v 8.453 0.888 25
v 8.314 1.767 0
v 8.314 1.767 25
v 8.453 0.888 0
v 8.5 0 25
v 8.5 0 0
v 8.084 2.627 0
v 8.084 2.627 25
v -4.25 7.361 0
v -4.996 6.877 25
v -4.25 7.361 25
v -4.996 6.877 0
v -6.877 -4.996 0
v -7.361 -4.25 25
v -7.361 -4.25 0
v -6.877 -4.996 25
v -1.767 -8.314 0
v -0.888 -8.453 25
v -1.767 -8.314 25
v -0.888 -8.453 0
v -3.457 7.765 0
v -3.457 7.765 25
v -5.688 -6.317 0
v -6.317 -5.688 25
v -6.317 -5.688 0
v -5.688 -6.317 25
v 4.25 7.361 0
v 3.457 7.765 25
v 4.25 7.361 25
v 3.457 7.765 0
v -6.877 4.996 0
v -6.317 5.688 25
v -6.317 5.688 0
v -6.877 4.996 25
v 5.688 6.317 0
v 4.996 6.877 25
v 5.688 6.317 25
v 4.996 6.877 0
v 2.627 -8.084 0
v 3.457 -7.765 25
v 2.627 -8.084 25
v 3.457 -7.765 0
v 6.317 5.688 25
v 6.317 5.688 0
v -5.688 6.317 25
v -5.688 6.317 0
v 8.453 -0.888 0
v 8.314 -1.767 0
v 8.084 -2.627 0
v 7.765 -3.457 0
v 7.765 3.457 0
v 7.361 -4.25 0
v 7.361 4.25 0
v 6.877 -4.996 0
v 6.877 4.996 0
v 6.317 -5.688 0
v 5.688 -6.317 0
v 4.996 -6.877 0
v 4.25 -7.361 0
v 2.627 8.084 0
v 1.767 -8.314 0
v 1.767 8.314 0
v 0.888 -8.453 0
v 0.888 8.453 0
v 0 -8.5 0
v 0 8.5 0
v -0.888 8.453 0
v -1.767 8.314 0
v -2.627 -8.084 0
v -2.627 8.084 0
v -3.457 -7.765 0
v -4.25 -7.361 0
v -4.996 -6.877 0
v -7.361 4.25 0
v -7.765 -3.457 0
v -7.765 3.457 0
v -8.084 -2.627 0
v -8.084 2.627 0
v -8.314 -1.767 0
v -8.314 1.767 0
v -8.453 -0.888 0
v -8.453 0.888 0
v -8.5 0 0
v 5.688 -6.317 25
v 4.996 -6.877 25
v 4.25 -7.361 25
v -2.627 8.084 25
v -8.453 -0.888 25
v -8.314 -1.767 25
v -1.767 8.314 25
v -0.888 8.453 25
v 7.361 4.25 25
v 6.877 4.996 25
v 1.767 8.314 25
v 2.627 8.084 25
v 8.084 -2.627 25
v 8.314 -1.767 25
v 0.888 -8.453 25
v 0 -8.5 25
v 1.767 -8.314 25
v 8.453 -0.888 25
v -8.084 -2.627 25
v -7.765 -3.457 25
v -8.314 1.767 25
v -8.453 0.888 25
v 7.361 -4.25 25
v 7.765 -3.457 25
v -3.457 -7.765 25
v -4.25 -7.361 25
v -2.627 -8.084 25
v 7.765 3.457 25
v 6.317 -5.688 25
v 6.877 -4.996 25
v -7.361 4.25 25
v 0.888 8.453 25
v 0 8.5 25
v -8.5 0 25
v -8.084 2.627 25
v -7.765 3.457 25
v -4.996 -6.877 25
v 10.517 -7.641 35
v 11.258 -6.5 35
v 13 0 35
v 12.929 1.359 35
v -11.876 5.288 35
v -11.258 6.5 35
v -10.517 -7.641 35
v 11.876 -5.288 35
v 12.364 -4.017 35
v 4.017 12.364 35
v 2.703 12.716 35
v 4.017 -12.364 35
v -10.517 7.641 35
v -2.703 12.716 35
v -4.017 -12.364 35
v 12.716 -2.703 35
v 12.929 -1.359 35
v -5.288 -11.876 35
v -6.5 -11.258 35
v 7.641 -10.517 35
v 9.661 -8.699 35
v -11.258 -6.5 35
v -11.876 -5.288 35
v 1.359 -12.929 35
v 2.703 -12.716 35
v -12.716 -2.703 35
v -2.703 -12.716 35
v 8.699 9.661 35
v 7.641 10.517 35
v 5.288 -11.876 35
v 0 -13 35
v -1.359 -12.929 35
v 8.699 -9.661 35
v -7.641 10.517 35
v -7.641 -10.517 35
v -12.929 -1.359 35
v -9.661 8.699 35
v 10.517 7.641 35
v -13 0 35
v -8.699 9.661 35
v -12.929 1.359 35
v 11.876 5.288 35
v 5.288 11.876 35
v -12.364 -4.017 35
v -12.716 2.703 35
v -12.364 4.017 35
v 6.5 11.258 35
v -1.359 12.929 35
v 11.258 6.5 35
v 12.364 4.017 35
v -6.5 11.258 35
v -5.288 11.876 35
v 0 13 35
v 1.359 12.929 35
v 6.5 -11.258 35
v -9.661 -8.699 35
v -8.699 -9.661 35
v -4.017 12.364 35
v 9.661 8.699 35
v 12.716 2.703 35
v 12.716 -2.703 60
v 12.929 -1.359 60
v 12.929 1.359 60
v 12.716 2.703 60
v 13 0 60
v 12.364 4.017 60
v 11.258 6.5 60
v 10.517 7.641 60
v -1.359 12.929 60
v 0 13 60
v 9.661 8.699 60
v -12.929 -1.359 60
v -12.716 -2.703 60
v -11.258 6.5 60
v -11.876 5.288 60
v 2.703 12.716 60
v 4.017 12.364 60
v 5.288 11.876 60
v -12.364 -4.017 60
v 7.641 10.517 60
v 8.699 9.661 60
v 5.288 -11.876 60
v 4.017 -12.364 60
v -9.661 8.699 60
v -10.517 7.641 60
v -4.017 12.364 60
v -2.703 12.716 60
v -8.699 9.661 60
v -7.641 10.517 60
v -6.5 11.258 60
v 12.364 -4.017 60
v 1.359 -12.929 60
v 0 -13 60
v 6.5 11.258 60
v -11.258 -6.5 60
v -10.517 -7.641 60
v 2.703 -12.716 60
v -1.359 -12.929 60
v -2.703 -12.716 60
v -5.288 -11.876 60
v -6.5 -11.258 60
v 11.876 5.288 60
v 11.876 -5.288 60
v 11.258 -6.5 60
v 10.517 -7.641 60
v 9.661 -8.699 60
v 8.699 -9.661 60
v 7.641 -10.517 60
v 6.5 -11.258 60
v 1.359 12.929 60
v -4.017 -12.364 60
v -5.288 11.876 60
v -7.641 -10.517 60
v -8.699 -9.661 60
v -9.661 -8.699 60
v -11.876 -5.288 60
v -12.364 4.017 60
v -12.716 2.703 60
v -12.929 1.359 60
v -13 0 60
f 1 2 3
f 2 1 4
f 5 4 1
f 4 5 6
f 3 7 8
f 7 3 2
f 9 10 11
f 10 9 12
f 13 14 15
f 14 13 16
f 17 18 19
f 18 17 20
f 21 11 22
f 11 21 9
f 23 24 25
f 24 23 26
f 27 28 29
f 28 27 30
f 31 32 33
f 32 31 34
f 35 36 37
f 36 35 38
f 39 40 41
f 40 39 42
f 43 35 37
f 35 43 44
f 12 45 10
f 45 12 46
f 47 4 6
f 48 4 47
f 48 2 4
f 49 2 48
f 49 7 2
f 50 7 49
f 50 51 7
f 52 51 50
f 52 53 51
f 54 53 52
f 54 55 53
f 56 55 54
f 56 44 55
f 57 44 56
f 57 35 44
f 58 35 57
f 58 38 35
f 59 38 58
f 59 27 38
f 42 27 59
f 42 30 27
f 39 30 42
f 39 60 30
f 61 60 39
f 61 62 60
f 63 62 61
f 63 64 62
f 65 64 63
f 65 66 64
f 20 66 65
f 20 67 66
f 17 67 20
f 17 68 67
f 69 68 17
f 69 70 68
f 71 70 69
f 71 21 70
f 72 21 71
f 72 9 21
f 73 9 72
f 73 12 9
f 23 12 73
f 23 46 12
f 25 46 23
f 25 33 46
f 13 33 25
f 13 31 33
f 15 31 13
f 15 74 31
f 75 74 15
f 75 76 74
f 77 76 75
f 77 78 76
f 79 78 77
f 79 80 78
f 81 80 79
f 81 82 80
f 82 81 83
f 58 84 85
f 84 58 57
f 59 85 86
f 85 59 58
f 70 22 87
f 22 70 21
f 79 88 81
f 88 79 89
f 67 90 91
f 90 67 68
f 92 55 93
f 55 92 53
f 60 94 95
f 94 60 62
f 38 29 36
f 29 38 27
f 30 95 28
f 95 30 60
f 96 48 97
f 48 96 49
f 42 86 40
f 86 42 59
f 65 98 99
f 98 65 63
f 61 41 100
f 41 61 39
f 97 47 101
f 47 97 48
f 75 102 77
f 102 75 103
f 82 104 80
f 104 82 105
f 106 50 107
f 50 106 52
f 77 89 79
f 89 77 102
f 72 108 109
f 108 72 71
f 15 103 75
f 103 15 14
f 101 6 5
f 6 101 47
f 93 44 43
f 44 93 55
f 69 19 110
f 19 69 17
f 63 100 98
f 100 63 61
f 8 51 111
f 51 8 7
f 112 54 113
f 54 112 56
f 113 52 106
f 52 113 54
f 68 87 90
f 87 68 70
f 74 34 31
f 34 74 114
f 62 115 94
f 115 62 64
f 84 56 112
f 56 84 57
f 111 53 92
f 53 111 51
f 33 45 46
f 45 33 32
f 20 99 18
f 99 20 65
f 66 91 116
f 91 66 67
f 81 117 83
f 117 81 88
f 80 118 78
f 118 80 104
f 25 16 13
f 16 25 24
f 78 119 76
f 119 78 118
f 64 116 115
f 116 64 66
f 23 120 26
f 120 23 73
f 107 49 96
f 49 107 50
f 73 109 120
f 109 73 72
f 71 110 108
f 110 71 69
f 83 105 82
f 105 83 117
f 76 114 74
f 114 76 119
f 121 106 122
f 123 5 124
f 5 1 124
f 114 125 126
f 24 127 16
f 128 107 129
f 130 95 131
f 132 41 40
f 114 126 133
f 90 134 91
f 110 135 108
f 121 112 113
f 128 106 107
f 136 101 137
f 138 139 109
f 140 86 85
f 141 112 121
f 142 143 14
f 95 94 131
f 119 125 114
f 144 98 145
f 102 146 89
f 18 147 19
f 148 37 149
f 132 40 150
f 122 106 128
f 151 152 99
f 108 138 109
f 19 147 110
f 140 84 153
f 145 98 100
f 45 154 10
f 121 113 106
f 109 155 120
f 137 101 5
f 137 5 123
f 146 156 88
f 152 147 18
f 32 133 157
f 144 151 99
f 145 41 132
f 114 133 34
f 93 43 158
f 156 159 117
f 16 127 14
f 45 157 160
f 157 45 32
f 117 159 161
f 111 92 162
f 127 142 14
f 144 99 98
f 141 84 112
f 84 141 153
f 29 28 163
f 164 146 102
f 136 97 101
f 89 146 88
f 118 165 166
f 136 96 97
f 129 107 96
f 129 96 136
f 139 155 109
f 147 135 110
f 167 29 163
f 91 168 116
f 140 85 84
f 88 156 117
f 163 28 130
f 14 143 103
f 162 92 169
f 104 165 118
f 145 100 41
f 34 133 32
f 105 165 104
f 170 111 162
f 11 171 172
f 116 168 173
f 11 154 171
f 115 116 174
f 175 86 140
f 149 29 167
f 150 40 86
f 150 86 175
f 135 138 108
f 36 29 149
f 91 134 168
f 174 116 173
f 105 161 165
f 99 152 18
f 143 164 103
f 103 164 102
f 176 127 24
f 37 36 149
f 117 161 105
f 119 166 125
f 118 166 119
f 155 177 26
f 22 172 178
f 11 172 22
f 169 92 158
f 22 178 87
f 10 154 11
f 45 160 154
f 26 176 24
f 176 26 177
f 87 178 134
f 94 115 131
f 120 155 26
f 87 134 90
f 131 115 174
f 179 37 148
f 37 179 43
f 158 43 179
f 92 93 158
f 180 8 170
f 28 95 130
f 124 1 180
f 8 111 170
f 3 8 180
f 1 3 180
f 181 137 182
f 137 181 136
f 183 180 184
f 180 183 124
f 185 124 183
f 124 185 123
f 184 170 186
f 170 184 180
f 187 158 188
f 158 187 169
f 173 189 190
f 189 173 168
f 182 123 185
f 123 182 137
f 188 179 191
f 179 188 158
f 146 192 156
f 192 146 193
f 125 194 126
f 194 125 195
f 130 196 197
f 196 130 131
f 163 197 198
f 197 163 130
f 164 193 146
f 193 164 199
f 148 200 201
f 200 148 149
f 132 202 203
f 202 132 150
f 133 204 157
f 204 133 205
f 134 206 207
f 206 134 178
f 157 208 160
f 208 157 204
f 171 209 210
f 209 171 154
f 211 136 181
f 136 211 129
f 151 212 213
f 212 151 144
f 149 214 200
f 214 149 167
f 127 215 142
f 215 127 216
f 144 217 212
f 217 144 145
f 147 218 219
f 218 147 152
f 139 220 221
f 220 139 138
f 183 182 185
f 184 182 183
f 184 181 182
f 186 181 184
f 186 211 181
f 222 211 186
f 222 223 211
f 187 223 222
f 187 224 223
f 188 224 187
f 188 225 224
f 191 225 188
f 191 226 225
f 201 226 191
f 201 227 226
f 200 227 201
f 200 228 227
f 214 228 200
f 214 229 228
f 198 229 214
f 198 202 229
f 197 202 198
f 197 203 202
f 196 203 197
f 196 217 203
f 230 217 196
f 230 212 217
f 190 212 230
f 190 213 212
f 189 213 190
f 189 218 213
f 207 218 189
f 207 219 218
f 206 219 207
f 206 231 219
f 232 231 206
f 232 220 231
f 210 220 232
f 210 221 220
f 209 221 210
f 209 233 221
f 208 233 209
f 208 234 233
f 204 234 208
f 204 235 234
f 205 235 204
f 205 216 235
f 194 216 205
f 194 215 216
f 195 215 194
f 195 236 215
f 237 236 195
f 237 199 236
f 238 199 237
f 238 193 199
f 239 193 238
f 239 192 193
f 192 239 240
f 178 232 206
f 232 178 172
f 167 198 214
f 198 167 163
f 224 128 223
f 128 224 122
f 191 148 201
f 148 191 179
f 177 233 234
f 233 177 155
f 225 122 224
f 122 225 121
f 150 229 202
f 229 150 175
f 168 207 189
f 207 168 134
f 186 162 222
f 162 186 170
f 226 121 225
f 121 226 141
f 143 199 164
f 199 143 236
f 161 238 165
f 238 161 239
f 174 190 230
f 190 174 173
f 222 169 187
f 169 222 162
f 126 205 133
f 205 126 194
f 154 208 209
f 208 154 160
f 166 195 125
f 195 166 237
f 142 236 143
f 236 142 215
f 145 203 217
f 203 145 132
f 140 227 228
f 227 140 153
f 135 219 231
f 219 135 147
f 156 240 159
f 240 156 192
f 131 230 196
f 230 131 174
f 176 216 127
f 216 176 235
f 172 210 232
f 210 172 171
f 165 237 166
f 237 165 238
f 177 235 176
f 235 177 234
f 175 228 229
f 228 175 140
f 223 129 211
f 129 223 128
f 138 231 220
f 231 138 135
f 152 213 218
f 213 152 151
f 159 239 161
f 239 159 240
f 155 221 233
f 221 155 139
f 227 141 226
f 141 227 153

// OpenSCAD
//
// PARAMETRIC SHUNNEL: SHAMPOO FUNNEL
//
// For decanting shampoo from one bottle to another.
//
// Author: RobotAnna
// https://www.printables.com/@RobotAnna
// CC Public Domain



// PARAMETERS
dia_outer =  26; // outer diameter of the shampoo bottle, give 2mm tolerance
dia_inner =  17; // inner diameter of the shampoo bottle, give 2mm tolerance
smoothing =  60; // cylinder smoothing: set to 60 while designing, and up to 300 for the final render.



// CONSTANTS
transition = 10; // you need approx 10mm to transition from large to small
height     = 25; // height of each side. 25mm keeps the bottles balancing without support.



// DERIVED



// MODULES



// PUT IT ALL TOGETHER
// colors are not necessary, this just helps to debug the code

color("LightGreen")
translate([0,0,0])
cylinder(h=height, d=dia_inner, center=false, $fn=smoothing);

color("LightPink")
translate([0,0,height])
cylinder(h=transition, d1=dia_inner, d2=dia_outer, center=false, $fn=smoothing); 

color("Wheat")
translate([0,0,transition+height])
cylinder(h=height, d=dia_outer, center=false, $fn=smoothing);
